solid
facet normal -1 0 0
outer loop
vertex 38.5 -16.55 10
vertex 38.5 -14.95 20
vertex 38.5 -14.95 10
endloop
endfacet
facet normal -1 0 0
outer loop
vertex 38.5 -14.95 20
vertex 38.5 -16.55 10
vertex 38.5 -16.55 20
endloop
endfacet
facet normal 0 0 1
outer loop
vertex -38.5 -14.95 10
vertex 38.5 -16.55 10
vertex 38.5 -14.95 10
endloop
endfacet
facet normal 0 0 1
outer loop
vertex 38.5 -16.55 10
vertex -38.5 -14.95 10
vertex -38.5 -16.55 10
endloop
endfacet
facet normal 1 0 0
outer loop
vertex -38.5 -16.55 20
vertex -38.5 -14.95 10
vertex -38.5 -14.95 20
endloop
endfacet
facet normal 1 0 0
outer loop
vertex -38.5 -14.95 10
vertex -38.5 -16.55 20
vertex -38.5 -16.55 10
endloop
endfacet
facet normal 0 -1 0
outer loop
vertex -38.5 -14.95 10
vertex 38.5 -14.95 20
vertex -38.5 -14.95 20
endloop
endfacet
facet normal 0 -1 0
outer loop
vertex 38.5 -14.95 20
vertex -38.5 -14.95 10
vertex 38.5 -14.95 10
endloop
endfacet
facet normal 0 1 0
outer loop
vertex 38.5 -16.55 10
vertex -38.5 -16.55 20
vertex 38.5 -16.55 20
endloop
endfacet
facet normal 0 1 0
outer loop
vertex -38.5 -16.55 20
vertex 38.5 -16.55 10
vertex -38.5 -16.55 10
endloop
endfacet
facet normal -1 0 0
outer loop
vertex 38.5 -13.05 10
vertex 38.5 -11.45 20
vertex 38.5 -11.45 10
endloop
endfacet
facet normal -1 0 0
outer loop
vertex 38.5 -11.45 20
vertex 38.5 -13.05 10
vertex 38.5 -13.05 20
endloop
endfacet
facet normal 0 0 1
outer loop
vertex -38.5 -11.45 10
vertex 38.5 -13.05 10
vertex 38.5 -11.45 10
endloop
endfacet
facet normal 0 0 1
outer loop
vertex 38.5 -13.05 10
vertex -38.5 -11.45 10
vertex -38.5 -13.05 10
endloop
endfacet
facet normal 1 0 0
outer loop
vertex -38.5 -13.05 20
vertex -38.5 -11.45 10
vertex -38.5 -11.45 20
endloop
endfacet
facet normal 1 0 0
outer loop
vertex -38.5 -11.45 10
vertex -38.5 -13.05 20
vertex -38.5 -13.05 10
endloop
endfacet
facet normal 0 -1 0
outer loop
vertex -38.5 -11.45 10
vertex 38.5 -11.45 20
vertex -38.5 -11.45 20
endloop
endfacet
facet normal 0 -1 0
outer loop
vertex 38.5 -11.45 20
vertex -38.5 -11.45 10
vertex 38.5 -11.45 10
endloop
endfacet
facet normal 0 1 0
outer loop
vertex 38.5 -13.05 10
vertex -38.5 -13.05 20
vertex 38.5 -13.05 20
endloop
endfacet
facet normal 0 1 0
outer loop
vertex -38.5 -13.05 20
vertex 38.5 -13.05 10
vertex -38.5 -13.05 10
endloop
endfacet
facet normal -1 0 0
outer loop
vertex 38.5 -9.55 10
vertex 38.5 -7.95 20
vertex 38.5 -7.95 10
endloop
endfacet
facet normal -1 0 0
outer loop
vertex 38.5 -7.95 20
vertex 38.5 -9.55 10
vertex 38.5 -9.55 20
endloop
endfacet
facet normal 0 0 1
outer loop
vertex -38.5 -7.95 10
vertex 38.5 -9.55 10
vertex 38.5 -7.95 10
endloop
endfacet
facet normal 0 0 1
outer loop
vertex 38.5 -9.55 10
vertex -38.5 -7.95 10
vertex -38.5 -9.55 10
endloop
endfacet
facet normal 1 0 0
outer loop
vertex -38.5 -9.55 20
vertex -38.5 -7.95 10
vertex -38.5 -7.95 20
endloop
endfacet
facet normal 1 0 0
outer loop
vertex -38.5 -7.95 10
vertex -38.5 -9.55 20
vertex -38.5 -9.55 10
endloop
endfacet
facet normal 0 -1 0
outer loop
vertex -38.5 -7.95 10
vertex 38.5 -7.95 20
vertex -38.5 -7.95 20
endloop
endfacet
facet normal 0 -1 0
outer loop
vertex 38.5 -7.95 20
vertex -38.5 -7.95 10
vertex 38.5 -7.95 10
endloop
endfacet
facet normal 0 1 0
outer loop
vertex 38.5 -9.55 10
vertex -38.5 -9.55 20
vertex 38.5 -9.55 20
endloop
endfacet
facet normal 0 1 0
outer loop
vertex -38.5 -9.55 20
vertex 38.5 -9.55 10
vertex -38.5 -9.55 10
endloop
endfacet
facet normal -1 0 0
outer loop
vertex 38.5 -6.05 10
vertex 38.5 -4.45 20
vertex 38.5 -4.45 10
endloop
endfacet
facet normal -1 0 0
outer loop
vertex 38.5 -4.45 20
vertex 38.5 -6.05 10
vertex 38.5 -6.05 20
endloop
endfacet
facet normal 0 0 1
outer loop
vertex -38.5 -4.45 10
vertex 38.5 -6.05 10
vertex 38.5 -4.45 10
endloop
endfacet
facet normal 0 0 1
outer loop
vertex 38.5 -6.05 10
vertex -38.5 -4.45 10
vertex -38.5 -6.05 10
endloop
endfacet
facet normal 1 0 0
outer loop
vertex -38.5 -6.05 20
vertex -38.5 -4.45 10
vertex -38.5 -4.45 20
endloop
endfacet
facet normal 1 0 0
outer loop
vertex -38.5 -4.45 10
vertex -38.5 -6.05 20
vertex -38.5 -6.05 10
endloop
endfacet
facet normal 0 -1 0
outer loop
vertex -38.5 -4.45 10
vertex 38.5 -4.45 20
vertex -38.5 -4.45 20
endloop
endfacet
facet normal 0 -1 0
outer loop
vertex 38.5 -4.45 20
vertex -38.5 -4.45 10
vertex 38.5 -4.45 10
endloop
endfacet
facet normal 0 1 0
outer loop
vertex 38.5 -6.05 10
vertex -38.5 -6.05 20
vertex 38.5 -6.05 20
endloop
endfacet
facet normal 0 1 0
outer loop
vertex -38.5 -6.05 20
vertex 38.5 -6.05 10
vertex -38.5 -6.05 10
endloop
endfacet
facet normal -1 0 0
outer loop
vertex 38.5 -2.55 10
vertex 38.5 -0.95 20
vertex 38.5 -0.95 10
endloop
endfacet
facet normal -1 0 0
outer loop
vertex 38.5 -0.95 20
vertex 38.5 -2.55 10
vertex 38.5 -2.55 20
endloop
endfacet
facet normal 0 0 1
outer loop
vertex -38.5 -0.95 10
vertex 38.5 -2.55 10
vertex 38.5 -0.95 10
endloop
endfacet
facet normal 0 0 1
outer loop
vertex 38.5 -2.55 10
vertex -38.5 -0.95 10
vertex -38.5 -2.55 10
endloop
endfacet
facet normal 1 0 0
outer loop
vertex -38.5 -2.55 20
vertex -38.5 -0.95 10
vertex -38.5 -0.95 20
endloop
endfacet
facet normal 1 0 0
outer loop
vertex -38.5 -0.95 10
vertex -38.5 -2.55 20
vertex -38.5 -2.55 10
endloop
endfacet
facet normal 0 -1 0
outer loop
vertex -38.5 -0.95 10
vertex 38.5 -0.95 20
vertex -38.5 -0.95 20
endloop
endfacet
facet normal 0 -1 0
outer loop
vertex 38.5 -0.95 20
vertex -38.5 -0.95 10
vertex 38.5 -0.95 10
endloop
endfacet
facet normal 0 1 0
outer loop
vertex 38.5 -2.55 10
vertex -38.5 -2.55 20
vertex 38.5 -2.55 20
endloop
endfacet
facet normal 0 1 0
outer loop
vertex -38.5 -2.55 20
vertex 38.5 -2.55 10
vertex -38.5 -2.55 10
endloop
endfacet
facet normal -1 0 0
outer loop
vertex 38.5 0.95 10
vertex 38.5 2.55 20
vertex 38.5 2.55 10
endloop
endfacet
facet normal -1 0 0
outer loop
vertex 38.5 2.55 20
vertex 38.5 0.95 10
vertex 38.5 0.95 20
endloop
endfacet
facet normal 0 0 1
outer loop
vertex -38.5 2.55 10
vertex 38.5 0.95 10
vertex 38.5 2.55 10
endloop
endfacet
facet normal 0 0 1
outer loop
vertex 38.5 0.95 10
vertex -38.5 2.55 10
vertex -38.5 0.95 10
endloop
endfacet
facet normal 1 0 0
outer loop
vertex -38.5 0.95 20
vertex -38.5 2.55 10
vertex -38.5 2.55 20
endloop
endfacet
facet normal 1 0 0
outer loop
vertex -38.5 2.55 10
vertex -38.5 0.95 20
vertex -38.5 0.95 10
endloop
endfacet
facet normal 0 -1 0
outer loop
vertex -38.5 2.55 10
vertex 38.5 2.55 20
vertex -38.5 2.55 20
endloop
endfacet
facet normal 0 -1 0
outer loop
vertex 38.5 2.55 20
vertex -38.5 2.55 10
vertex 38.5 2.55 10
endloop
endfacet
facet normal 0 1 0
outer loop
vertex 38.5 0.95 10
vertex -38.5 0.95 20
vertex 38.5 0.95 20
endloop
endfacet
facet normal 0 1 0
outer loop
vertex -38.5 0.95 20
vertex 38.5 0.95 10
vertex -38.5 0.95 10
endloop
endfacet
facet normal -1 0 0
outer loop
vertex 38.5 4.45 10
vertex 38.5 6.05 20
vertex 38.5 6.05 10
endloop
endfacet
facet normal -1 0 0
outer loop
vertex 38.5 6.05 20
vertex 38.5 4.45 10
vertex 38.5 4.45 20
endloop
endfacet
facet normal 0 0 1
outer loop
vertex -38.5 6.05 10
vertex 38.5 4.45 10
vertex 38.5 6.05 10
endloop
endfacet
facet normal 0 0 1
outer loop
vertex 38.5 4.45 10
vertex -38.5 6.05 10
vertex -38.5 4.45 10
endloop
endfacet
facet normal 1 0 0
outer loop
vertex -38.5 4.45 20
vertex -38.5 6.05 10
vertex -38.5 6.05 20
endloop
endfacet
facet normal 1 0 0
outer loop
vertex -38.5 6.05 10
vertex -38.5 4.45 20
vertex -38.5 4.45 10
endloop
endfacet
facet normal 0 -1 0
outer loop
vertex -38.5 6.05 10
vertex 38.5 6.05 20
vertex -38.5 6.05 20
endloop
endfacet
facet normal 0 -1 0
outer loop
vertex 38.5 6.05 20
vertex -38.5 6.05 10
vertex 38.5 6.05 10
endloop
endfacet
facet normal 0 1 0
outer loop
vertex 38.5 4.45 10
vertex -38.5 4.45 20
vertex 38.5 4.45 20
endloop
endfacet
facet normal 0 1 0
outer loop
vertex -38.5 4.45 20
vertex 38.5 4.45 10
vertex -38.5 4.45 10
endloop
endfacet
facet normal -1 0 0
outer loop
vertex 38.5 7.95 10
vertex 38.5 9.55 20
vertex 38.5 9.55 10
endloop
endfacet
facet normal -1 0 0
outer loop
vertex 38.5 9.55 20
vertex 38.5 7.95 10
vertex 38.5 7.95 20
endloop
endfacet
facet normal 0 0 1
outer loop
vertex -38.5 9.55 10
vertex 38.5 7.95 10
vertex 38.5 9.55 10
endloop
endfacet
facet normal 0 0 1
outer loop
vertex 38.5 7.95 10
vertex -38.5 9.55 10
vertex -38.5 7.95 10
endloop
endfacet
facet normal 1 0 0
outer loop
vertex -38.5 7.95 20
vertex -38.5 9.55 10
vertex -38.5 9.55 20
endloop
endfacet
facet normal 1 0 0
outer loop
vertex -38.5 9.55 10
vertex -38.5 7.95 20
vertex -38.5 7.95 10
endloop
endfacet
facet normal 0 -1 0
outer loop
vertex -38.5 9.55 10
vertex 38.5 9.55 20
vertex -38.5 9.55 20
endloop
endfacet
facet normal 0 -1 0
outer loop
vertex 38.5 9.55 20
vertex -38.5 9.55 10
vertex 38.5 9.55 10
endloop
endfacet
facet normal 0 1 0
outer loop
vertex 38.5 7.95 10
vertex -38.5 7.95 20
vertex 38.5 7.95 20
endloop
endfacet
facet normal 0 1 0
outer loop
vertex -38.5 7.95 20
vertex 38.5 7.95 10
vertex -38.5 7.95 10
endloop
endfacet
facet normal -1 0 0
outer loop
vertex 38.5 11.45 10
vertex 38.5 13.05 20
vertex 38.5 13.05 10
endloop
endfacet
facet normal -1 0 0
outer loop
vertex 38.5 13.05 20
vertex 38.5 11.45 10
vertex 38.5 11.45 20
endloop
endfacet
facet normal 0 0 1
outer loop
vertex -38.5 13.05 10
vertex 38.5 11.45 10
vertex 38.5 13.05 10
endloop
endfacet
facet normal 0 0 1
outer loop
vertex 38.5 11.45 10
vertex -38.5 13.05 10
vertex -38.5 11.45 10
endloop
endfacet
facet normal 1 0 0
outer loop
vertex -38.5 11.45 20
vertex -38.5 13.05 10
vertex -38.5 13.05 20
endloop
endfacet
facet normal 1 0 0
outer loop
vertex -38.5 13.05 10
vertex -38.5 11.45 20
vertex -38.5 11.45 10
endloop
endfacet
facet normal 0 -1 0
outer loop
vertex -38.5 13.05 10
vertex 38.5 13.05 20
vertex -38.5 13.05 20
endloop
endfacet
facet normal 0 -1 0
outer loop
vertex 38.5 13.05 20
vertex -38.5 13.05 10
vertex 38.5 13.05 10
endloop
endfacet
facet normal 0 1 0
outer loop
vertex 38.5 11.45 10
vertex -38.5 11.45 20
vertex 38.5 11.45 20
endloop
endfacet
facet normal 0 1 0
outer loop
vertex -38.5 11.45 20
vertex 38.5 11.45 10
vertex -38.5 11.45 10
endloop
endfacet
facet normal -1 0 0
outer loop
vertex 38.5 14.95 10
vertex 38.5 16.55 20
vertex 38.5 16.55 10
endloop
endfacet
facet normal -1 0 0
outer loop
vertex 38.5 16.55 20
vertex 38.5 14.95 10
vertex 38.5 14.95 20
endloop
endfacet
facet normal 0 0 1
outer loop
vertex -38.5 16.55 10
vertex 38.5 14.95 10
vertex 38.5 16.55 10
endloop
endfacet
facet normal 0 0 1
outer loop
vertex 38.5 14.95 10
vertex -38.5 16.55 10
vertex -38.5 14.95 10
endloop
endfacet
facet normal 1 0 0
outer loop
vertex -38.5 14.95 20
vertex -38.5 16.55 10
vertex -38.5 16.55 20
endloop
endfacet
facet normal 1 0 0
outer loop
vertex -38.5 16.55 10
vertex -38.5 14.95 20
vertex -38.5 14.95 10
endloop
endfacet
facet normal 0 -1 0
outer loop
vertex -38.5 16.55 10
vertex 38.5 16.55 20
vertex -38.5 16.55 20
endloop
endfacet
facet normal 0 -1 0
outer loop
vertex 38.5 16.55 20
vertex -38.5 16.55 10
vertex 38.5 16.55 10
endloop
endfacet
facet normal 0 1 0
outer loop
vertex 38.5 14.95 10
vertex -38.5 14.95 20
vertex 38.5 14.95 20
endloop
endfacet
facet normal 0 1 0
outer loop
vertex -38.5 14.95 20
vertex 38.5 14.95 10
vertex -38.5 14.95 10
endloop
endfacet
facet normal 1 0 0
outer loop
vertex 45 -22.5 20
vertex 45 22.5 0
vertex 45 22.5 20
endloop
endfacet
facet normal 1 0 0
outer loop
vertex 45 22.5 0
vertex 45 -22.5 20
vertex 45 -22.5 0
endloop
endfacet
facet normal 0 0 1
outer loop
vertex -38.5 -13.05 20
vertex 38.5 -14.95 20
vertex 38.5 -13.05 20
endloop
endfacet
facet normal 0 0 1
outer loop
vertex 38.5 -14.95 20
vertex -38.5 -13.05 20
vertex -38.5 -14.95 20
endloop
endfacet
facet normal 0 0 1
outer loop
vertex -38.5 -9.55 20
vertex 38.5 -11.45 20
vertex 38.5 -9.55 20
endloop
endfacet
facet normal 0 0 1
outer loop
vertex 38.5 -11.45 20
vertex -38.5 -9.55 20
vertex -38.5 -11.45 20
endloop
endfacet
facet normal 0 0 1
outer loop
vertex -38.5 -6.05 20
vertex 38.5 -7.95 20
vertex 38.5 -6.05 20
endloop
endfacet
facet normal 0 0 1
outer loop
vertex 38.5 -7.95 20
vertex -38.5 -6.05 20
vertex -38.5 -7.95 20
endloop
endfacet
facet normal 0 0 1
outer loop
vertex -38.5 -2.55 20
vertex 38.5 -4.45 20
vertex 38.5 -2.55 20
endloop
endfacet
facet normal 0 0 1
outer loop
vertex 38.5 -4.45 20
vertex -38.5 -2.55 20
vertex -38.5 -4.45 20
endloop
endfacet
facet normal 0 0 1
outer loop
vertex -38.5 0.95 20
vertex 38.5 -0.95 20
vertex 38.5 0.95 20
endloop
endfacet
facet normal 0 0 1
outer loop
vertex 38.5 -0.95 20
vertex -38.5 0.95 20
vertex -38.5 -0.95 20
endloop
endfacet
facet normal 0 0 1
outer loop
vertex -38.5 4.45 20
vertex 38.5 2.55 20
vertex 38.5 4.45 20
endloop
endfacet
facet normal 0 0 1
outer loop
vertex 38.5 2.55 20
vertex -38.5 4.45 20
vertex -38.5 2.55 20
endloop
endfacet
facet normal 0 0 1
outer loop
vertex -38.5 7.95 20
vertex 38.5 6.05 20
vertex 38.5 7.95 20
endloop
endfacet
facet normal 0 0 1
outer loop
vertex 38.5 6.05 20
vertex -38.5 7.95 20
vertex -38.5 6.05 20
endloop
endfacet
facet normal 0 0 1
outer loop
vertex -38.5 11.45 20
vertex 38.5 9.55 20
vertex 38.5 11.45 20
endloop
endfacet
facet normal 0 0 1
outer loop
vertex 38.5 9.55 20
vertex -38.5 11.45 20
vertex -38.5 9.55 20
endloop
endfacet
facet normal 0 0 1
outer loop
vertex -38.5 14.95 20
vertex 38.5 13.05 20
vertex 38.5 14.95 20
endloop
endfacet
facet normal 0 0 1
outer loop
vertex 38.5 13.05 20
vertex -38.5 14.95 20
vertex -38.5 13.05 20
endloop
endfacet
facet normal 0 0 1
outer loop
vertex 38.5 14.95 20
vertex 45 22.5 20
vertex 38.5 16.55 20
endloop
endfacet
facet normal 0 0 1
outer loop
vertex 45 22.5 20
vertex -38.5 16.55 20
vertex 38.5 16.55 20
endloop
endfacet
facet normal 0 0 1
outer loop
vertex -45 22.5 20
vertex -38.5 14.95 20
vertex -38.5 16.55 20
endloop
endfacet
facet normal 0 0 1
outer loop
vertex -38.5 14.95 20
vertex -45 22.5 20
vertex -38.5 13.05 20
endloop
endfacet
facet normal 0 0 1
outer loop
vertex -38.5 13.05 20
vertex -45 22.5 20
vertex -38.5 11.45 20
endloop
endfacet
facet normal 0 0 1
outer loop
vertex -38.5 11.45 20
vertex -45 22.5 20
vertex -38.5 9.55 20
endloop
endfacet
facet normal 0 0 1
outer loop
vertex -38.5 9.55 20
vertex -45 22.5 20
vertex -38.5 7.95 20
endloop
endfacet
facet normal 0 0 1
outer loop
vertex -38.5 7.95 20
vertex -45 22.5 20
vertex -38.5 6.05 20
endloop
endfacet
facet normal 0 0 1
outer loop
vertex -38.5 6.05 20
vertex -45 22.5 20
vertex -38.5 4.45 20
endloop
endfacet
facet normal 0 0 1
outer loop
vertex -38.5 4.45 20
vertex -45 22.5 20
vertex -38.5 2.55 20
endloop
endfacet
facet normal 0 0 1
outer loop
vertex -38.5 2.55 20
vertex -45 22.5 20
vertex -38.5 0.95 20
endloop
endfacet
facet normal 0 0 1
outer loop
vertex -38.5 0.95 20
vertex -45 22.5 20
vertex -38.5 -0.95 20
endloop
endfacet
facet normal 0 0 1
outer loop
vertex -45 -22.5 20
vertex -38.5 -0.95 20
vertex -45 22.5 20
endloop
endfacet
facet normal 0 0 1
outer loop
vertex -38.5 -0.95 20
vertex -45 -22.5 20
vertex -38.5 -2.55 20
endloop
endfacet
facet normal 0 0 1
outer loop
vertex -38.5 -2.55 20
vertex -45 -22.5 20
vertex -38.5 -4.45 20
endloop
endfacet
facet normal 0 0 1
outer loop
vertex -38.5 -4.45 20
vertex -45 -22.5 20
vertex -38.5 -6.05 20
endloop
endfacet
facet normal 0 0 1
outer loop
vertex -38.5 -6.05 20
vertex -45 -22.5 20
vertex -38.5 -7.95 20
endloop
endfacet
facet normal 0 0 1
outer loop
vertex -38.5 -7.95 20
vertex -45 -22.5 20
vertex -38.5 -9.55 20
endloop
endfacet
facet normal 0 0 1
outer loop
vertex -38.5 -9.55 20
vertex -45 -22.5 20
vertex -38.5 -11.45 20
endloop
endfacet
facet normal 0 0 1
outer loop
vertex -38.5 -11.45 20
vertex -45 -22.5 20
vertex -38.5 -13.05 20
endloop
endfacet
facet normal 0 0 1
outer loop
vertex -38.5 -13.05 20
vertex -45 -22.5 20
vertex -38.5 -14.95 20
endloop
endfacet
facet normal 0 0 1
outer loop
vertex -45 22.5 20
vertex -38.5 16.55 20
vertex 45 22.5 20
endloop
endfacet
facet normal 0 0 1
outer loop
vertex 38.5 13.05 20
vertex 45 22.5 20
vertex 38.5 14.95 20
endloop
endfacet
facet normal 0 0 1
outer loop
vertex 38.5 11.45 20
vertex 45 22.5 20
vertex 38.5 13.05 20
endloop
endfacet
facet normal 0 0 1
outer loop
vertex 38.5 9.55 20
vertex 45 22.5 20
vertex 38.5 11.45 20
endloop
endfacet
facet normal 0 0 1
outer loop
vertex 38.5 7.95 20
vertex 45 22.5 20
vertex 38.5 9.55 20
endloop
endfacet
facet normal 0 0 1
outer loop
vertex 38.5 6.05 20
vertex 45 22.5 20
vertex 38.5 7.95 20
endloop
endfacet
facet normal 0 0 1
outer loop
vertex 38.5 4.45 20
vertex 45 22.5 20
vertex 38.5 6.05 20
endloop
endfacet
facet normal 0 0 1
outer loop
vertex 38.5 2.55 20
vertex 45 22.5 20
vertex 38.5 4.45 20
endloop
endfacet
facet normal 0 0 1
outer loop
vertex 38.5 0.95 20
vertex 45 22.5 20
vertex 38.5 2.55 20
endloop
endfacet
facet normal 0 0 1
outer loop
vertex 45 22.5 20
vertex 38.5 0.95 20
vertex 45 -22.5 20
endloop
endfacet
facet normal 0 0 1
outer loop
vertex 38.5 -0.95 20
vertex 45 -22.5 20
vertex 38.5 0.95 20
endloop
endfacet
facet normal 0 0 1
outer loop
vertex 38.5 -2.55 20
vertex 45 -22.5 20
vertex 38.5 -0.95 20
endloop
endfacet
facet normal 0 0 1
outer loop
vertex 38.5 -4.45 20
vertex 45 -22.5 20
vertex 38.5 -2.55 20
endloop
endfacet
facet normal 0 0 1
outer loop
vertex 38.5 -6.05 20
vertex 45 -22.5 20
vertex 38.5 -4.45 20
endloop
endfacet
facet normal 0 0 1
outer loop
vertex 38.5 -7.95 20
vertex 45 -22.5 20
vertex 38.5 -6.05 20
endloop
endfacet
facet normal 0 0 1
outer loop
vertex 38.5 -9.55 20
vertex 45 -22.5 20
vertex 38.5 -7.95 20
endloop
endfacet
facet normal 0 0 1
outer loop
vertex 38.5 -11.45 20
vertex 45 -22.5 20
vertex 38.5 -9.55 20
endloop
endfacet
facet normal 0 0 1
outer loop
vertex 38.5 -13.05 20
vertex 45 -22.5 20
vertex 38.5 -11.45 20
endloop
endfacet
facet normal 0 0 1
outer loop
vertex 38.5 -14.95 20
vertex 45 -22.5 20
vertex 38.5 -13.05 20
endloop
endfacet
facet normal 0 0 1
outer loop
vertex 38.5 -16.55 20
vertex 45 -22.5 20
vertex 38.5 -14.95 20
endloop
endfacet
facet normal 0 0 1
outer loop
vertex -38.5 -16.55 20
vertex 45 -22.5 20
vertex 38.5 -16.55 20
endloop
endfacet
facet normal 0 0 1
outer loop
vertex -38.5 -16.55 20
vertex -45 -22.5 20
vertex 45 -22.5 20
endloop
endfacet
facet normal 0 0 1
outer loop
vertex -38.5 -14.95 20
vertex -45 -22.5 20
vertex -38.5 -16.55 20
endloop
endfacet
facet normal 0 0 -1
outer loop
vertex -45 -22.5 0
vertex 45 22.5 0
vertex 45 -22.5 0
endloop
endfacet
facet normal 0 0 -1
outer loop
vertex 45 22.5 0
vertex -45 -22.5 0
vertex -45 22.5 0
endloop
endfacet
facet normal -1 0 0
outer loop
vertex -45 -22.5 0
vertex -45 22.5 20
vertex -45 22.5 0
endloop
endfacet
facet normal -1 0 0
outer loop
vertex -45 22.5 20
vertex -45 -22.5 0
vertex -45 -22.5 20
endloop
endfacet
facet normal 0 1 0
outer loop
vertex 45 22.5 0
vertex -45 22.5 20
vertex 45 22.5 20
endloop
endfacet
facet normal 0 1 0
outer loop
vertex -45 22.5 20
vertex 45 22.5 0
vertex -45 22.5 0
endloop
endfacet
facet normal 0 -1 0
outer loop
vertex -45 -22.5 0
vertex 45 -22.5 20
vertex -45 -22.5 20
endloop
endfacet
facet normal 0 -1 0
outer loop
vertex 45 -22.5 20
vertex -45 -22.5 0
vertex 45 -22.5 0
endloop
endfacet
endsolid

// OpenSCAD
// Drying rack for 10 microscope slides (75 x 25 x 1 mm)
// Slides stand upright on their long edge, held in slots cut into the top face.

// --- Base block dimensions ---
base_L = 90;   // length along X (mm)
base_W = 45;   // width along Y (mm)
base_H = 20;   // height along Z (mm)

// --- Slot dimensions ---
slot_L = 77;   // slot length along X (mm)
slot_W = 1.6;  // slot width along Y (mm)
slot_D = 10;   // slot depth along Z (mm)

// --- Slot layout ---
n_slots = 10;          // number of slots
slot_pitch = 3.5;      // centre-to-centre spacing along Y (mm)

// --- Render quality ---
$fn = 64;

// --- Build the rack ---
// The base block is centred on the origin in X and Y, resting on z = 0.
// Slots are cut from the top face, open at the top, running along X.

difference() {
    // Solid base block, centred in X and Y
    translate([-base_L/2, -base_W/2, 0])
        cube([base_L, base_W, base_H]);

    // Cut 10 parallel slots into the top face
    for (i = [0 : n_slots - 1]) {
        // Each slot is a rectangular prism running along X,
        // centred on the block in X, positioned at the correct Y offset.
        // The slot is 10 mm deep, open at the top (z = base_H).
        // Extend 0.5 mm past the top face to ensure clean cuts.
        
        y_offset = (i - (n_slots - 1) / 2.0) * slot_pitch;
        
        translate([-slot_L/2, y_offset - slot_W/2, base_H - slot_D])
            cube([slot_L, slot_W, slot_D + 0.5]);
    }
}
